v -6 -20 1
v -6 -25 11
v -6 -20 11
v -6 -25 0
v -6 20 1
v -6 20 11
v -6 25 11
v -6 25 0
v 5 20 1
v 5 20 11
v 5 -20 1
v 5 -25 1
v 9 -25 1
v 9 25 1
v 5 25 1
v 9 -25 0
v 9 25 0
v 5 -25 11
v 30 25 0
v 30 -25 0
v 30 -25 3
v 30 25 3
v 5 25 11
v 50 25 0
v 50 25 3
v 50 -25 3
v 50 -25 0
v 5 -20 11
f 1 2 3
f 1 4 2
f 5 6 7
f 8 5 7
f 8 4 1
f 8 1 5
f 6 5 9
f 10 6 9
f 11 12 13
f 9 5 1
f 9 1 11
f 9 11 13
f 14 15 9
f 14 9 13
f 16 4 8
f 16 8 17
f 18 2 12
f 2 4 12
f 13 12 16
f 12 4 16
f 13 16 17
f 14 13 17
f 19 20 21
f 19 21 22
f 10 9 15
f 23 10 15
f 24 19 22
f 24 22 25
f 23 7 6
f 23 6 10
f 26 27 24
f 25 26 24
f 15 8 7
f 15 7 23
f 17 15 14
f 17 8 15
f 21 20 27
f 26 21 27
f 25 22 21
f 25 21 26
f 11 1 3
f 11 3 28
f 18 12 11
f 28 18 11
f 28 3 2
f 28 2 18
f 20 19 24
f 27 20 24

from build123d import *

# Parameters (mm, degrees)
F0_W     = 15
F0_H     = 50
F1_DEPTH = 1
F2_W     = 11
F2_H     = 5
F3_DEPTH = 10
F4_W     = 20
F4_H     = 50
F5_DEPTH = 3


with BuildPart() as f1:
    # F0 (on Top) → F1 (new body)
    with BuildSketch(Plane.XY):
        with Locations((1.5, 0)):
            Rectangle(F0_W, F0_H)
    extrude(amount=F1_DEPTH)

    # F2 (on face) → F3 (join)
    with BuildSketch(Plane.XY.offset(1)):
        with Locations((-0.5, -22.5)):
            Rectangle(F2_W, F2_H)
        with Locations((-0.5, 22.5)):
            Rectangle(F2_W, F2_H)
    extrude(amount=F3_DEPTH)


with BuildPart() as f5:
    # F4 (on Top) → F5 (new body)
    with BuildSketch(Plane.XY):
        with Locations((40, 0)):
            Rectangle(F4_W, F4_H)
    extrude(amount=F5_DEPTH)


solid = Compound([f1.part, f5.part])
